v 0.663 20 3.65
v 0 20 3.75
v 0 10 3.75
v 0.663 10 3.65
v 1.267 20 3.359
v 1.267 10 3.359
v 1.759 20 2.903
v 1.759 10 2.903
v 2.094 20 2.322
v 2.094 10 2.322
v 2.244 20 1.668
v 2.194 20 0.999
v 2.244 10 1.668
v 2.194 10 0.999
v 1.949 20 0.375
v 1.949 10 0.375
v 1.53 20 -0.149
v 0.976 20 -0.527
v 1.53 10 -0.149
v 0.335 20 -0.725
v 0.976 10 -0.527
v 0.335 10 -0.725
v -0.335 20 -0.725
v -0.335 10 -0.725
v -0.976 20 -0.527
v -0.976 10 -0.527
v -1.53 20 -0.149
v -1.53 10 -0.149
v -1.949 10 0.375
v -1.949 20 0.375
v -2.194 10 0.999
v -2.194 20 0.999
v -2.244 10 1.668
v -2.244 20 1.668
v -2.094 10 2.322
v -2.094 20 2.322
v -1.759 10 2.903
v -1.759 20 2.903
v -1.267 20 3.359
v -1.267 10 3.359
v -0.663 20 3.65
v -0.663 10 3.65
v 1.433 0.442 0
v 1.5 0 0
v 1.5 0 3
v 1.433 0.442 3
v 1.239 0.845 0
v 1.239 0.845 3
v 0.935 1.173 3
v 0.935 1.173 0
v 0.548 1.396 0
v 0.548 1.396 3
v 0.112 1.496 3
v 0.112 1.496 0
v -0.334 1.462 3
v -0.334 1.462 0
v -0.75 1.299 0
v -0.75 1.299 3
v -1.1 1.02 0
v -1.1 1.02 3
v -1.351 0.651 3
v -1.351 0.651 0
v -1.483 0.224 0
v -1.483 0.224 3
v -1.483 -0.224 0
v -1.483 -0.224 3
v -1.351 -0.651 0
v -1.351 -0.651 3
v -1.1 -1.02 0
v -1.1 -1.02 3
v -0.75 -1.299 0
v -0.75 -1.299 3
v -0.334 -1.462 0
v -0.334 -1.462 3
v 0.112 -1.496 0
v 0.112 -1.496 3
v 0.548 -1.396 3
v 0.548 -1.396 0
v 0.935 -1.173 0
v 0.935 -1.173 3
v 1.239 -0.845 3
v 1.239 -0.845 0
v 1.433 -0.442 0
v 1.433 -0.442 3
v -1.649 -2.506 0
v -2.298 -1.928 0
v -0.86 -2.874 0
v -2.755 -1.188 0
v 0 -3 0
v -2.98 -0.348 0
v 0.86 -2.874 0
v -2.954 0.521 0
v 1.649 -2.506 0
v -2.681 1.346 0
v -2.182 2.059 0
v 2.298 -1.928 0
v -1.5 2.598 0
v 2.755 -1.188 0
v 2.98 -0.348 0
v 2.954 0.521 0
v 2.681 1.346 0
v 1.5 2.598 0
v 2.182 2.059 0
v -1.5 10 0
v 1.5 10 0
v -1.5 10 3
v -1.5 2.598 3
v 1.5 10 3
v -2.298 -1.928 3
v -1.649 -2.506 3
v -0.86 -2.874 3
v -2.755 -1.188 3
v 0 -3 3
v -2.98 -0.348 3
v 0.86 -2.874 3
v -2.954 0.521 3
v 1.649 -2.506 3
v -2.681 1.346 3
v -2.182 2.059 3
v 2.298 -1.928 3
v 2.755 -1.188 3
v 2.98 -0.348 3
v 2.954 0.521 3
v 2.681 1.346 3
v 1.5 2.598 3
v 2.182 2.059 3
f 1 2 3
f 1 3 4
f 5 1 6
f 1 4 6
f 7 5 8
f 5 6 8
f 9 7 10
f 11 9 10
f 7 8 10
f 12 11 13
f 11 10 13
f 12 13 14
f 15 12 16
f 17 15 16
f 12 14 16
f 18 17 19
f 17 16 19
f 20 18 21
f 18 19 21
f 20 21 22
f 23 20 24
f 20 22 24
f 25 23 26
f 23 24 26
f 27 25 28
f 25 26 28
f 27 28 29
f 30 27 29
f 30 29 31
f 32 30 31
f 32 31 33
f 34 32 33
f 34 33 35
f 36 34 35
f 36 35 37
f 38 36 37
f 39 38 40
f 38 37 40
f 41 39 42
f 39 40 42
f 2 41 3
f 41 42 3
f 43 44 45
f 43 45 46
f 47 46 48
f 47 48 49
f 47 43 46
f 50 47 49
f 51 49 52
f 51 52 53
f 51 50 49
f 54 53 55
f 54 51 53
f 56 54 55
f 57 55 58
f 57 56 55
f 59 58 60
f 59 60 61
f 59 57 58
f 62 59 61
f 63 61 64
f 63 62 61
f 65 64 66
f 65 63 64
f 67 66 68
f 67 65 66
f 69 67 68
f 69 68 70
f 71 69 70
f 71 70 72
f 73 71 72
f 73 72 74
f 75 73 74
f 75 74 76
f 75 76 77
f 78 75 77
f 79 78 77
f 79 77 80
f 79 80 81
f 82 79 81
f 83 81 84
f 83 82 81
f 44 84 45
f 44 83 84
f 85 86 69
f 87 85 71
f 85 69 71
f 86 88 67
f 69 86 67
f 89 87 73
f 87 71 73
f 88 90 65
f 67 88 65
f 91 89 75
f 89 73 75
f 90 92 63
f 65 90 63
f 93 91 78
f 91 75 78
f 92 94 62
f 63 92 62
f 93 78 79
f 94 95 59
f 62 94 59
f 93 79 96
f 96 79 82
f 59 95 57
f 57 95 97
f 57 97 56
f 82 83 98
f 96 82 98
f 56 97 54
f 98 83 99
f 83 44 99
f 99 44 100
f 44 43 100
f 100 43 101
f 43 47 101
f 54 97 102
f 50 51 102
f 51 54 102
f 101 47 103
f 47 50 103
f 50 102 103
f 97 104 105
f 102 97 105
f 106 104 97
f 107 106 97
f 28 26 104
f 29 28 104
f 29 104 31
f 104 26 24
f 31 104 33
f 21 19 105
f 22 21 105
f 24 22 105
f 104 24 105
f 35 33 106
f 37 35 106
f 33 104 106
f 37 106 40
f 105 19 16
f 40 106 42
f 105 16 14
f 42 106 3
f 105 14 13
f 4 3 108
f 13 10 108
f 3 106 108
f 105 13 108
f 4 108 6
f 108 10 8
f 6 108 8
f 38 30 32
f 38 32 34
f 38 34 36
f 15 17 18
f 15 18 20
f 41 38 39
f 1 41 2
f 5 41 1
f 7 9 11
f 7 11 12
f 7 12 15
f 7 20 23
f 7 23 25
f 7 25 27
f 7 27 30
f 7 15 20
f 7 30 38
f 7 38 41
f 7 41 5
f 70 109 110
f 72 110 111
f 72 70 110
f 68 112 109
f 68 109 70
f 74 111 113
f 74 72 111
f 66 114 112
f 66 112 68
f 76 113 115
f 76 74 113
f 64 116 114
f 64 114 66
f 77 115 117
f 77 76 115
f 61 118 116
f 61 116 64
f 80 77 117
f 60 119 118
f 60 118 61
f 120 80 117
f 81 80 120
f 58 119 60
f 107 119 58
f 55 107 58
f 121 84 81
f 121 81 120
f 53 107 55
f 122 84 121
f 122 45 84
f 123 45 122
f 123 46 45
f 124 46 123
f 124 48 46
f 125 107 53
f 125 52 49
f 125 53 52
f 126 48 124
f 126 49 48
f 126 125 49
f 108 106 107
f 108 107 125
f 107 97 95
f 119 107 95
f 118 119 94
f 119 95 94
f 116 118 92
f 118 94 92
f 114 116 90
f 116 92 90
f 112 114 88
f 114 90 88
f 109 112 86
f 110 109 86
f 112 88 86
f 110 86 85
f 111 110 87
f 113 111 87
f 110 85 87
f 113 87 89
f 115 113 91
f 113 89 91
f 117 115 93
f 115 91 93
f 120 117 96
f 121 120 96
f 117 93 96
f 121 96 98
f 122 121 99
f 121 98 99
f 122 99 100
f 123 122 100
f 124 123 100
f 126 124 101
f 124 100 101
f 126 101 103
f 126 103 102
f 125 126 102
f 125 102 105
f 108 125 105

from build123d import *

# Parameters (mm, degrees)
CROQUIS1_R              = 1.5
SALIENTE_EXTRUIR1_DEPTH = 3
CROQUIS2_R              = 2.25
SALIENTE_EXTRUIR2_DEPTH = 10


with BuildPart() as part:
    # Croquis1 → Saliente-Extruir1 (new body)
    with BuildSketch(Plane.XY):
        with BuildLine():
            Line((1.5, 10), (-1.5, 10))
            Line((-1.5, 10), (-1.5, 2.598076211))
            ThreePointArc((-1.5, 2.598076211), (0, -3), (1.5, 2.598076211))
            Line((1.5, 2.598076211), (1.5, 10))
        make_face()
        Circle(CROQUIS1_R, mode=Mode.SUBTRACT)
    extrude(amount=SALIENTE_EXTRUIR1_DEPTH)

    # Croquis2 → Saliente-Extruir2 (add)
    with BuildSketch(Plane(origin=(0, 10, 0), x_dir=(1, 0, 0), z_dir=(0, 1, 0))):
        with Locations(Location((0, -1.5, 0), (0, 0, 270))):
            Circle(CROQUIS2_R)
    extrude(amount=SALIENTE_EXTRUIR2_DEPTH)


solid = part.part
